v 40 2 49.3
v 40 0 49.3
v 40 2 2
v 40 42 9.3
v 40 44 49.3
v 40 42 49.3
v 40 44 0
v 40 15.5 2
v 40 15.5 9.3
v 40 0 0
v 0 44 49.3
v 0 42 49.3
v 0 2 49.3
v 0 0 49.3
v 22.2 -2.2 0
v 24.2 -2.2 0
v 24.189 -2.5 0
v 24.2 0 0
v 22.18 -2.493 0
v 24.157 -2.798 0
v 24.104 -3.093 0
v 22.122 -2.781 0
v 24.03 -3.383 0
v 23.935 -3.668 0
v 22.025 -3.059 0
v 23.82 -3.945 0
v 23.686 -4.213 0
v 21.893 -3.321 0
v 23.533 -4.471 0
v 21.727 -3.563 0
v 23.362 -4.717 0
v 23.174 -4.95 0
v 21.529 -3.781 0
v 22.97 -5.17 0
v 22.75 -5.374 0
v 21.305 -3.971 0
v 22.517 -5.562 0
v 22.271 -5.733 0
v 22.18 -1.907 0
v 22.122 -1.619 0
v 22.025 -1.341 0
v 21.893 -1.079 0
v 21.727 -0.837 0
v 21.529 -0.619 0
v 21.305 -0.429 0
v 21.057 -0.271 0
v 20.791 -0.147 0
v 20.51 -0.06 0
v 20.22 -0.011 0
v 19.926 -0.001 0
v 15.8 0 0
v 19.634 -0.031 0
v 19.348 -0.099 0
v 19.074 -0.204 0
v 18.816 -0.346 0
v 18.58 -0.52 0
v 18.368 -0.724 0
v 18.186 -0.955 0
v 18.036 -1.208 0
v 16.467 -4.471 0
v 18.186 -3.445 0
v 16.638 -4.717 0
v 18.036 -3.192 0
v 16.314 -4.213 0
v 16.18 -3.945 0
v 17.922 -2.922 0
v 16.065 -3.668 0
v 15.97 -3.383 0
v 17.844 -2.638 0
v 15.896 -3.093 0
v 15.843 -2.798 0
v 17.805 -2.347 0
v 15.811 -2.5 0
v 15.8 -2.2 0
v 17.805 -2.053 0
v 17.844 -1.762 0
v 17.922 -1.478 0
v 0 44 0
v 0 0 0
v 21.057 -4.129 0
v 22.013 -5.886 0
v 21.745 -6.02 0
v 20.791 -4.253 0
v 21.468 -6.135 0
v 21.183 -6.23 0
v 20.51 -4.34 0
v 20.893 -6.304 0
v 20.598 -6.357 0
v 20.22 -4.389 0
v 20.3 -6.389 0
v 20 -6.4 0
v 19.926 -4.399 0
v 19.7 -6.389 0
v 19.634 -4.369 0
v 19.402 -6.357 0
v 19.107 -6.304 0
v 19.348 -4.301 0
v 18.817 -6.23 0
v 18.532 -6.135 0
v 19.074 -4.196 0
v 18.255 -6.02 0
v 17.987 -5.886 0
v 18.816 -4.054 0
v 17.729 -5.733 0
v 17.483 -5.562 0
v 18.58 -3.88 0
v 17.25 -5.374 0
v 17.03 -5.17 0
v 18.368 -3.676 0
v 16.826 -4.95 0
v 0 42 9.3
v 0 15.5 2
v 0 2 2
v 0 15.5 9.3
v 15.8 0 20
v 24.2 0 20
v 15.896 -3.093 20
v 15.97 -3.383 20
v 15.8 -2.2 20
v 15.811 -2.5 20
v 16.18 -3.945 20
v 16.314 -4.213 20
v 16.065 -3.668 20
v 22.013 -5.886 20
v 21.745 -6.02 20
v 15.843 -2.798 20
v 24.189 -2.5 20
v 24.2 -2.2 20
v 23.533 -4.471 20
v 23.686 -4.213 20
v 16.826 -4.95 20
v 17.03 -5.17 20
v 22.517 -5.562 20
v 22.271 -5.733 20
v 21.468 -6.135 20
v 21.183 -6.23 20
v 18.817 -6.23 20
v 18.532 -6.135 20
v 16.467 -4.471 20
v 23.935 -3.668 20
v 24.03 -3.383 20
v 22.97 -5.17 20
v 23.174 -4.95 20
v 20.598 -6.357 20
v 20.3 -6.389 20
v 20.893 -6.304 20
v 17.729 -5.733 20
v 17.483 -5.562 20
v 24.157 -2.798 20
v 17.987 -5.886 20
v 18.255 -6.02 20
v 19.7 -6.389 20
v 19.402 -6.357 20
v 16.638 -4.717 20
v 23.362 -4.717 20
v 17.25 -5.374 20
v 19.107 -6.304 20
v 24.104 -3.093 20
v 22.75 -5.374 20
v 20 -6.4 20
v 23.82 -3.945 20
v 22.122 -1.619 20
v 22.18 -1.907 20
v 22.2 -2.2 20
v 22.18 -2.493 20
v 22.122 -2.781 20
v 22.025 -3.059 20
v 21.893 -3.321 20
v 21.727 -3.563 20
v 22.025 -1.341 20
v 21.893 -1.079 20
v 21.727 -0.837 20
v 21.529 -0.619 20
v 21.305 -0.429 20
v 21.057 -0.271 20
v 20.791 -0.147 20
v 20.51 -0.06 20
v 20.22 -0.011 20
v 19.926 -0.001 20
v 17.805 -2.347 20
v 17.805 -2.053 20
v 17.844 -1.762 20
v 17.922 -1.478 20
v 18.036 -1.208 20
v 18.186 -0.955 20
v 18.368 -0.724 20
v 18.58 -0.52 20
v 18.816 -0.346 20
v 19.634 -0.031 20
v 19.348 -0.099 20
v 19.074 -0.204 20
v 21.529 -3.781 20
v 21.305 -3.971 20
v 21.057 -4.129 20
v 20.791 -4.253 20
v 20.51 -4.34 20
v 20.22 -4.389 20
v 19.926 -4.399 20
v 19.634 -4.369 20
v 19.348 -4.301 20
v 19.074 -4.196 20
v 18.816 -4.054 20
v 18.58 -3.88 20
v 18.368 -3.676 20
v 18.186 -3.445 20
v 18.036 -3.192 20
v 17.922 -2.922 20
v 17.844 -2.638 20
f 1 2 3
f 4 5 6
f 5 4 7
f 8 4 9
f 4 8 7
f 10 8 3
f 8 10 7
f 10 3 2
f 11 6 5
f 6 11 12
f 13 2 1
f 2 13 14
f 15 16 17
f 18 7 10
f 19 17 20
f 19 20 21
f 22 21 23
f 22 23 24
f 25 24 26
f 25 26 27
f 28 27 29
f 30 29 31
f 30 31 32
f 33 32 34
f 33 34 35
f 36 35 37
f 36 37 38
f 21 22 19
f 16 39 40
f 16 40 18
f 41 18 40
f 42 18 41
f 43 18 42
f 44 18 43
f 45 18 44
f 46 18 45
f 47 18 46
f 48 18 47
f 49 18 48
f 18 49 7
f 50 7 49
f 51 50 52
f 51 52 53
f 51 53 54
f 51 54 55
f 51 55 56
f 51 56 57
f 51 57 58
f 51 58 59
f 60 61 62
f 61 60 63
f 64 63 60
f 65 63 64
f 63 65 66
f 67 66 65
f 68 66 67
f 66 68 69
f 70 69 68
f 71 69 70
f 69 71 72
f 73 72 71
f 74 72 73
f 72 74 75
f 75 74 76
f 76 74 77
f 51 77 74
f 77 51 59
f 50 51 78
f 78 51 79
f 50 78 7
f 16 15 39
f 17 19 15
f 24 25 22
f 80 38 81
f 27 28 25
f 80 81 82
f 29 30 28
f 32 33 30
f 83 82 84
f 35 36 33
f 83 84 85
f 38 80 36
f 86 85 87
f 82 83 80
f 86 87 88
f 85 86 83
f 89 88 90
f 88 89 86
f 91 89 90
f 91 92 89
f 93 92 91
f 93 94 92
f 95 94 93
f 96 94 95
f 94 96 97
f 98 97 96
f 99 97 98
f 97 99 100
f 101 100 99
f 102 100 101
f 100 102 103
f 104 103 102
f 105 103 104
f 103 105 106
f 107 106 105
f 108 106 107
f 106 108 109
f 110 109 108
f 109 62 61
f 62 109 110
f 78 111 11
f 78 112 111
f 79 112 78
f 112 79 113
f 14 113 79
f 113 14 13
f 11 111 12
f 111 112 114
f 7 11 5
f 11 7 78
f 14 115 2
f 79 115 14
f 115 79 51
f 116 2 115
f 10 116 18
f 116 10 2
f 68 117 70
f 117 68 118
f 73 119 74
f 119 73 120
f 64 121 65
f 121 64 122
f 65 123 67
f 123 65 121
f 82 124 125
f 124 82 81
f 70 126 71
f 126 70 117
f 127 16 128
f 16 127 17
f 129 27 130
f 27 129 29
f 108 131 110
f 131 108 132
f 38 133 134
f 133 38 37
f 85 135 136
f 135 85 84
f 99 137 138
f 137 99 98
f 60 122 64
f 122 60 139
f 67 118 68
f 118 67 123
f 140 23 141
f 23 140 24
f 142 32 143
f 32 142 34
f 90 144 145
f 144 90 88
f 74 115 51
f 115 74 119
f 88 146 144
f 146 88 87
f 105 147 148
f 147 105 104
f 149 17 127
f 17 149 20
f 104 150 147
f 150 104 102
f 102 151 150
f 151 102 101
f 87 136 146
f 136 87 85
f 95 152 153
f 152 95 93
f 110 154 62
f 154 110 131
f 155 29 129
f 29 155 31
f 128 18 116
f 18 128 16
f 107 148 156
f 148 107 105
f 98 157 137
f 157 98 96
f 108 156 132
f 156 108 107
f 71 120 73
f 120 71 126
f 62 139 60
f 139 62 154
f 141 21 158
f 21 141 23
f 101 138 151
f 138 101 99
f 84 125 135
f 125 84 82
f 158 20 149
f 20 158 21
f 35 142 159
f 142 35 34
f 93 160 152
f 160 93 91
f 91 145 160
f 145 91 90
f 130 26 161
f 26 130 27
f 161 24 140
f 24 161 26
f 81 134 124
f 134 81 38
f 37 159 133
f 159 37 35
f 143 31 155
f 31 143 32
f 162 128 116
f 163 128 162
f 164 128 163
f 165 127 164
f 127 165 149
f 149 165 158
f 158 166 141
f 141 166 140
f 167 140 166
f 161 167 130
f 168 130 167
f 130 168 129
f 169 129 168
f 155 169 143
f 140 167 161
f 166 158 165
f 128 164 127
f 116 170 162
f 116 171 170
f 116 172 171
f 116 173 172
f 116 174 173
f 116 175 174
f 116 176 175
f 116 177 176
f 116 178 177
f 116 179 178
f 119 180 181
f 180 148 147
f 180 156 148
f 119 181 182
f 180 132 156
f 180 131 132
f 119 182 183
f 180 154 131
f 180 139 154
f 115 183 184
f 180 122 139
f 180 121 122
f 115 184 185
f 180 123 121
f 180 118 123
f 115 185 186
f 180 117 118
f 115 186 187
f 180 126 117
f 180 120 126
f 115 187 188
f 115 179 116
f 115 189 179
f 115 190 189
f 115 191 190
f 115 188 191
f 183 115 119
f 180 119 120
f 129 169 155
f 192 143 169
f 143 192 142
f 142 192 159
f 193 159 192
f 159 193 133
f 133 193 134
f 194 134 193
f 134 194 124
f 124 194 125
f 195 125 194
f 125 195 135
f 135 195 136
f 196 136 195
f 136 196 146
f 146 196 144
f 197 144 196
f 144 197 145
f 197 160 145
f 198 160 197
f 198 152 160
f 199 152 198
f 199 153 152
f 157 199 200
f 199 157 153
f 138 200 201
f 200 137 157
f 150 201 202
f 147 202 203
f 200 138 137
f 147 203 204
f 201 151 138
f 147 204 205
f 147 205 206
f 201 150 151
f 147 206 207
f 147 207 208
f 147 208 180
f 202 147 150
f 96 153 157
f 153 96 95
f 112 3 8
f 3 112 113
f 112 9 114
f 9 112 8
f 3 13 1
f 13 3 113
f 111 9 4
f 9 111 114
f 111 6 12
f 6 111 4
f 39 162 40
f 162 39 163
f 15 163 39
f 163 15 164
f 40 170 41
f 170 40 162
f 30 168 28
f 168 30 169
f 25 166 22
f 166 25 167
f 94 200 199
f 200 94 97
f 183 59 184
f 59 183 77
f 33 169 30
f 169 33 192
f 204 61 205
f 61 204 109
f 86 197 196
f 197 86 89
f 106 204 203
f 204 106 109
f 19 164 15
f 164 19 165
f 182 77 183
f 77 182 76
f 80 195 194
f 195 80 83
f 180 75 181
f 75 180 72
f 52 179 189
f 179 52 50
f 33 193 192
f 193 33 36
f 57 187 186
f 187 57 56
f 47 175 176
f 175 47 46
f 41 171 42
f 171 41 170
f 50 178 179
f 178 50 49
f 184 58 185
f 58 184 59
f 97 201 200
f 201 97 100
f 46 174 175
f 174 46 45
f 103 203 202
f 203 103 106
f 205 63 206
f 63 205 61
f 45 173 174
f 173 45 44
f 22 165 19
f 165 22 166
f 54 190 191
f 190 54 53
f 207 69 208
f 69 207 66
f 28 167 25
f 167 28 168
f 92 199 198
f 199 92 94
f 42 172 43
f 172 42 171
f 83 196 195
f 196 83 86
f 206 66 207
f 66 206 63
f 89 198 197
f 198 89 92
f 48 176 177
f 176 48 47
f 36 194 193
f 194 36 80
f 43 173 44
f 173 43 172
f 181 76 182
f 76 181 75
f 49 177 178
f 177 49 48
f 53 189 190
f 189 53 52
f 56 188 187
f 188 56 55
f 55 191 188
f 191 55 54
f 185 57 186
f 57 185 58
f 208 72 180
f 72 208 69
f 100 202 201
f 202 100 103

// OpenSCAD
width_small = 13.5;
width_large = 40;
ridge_depth = 7.3;
toy_radius = 4.4 / 2;

thickness = 2;
length = 40;
depth = 40;
$fs = 0.3;
$fa = 1;


difference() {
	union() {
		cube([length, width_large + thickness * 2, thickness + ridge_depth + depth]);
		translate([length / 2, 0, 0]) {
			hull() {
				cylinder(r=toy_radius + thickness, h=depth / 2);
				translate([0, -toy_radius, 0]) {
					cylinder(r=toy_radius + thickness, h=depth / 2);
				}
			}
		}
	}
	translate([-1, thickness, thickness]) {
		cube([length + 2, width_small, ridge_depth + depth + 1]);
	}
	translate([-1, thickness, thickness + ridge_depth]) {
		cube([length + 2, width_large, depth + 1]);
	}
	translate([length / 2, -toy_radius, -1]) {
		cylinder(r=toy_radius, h=depth / 2 + 2);
	}
}
